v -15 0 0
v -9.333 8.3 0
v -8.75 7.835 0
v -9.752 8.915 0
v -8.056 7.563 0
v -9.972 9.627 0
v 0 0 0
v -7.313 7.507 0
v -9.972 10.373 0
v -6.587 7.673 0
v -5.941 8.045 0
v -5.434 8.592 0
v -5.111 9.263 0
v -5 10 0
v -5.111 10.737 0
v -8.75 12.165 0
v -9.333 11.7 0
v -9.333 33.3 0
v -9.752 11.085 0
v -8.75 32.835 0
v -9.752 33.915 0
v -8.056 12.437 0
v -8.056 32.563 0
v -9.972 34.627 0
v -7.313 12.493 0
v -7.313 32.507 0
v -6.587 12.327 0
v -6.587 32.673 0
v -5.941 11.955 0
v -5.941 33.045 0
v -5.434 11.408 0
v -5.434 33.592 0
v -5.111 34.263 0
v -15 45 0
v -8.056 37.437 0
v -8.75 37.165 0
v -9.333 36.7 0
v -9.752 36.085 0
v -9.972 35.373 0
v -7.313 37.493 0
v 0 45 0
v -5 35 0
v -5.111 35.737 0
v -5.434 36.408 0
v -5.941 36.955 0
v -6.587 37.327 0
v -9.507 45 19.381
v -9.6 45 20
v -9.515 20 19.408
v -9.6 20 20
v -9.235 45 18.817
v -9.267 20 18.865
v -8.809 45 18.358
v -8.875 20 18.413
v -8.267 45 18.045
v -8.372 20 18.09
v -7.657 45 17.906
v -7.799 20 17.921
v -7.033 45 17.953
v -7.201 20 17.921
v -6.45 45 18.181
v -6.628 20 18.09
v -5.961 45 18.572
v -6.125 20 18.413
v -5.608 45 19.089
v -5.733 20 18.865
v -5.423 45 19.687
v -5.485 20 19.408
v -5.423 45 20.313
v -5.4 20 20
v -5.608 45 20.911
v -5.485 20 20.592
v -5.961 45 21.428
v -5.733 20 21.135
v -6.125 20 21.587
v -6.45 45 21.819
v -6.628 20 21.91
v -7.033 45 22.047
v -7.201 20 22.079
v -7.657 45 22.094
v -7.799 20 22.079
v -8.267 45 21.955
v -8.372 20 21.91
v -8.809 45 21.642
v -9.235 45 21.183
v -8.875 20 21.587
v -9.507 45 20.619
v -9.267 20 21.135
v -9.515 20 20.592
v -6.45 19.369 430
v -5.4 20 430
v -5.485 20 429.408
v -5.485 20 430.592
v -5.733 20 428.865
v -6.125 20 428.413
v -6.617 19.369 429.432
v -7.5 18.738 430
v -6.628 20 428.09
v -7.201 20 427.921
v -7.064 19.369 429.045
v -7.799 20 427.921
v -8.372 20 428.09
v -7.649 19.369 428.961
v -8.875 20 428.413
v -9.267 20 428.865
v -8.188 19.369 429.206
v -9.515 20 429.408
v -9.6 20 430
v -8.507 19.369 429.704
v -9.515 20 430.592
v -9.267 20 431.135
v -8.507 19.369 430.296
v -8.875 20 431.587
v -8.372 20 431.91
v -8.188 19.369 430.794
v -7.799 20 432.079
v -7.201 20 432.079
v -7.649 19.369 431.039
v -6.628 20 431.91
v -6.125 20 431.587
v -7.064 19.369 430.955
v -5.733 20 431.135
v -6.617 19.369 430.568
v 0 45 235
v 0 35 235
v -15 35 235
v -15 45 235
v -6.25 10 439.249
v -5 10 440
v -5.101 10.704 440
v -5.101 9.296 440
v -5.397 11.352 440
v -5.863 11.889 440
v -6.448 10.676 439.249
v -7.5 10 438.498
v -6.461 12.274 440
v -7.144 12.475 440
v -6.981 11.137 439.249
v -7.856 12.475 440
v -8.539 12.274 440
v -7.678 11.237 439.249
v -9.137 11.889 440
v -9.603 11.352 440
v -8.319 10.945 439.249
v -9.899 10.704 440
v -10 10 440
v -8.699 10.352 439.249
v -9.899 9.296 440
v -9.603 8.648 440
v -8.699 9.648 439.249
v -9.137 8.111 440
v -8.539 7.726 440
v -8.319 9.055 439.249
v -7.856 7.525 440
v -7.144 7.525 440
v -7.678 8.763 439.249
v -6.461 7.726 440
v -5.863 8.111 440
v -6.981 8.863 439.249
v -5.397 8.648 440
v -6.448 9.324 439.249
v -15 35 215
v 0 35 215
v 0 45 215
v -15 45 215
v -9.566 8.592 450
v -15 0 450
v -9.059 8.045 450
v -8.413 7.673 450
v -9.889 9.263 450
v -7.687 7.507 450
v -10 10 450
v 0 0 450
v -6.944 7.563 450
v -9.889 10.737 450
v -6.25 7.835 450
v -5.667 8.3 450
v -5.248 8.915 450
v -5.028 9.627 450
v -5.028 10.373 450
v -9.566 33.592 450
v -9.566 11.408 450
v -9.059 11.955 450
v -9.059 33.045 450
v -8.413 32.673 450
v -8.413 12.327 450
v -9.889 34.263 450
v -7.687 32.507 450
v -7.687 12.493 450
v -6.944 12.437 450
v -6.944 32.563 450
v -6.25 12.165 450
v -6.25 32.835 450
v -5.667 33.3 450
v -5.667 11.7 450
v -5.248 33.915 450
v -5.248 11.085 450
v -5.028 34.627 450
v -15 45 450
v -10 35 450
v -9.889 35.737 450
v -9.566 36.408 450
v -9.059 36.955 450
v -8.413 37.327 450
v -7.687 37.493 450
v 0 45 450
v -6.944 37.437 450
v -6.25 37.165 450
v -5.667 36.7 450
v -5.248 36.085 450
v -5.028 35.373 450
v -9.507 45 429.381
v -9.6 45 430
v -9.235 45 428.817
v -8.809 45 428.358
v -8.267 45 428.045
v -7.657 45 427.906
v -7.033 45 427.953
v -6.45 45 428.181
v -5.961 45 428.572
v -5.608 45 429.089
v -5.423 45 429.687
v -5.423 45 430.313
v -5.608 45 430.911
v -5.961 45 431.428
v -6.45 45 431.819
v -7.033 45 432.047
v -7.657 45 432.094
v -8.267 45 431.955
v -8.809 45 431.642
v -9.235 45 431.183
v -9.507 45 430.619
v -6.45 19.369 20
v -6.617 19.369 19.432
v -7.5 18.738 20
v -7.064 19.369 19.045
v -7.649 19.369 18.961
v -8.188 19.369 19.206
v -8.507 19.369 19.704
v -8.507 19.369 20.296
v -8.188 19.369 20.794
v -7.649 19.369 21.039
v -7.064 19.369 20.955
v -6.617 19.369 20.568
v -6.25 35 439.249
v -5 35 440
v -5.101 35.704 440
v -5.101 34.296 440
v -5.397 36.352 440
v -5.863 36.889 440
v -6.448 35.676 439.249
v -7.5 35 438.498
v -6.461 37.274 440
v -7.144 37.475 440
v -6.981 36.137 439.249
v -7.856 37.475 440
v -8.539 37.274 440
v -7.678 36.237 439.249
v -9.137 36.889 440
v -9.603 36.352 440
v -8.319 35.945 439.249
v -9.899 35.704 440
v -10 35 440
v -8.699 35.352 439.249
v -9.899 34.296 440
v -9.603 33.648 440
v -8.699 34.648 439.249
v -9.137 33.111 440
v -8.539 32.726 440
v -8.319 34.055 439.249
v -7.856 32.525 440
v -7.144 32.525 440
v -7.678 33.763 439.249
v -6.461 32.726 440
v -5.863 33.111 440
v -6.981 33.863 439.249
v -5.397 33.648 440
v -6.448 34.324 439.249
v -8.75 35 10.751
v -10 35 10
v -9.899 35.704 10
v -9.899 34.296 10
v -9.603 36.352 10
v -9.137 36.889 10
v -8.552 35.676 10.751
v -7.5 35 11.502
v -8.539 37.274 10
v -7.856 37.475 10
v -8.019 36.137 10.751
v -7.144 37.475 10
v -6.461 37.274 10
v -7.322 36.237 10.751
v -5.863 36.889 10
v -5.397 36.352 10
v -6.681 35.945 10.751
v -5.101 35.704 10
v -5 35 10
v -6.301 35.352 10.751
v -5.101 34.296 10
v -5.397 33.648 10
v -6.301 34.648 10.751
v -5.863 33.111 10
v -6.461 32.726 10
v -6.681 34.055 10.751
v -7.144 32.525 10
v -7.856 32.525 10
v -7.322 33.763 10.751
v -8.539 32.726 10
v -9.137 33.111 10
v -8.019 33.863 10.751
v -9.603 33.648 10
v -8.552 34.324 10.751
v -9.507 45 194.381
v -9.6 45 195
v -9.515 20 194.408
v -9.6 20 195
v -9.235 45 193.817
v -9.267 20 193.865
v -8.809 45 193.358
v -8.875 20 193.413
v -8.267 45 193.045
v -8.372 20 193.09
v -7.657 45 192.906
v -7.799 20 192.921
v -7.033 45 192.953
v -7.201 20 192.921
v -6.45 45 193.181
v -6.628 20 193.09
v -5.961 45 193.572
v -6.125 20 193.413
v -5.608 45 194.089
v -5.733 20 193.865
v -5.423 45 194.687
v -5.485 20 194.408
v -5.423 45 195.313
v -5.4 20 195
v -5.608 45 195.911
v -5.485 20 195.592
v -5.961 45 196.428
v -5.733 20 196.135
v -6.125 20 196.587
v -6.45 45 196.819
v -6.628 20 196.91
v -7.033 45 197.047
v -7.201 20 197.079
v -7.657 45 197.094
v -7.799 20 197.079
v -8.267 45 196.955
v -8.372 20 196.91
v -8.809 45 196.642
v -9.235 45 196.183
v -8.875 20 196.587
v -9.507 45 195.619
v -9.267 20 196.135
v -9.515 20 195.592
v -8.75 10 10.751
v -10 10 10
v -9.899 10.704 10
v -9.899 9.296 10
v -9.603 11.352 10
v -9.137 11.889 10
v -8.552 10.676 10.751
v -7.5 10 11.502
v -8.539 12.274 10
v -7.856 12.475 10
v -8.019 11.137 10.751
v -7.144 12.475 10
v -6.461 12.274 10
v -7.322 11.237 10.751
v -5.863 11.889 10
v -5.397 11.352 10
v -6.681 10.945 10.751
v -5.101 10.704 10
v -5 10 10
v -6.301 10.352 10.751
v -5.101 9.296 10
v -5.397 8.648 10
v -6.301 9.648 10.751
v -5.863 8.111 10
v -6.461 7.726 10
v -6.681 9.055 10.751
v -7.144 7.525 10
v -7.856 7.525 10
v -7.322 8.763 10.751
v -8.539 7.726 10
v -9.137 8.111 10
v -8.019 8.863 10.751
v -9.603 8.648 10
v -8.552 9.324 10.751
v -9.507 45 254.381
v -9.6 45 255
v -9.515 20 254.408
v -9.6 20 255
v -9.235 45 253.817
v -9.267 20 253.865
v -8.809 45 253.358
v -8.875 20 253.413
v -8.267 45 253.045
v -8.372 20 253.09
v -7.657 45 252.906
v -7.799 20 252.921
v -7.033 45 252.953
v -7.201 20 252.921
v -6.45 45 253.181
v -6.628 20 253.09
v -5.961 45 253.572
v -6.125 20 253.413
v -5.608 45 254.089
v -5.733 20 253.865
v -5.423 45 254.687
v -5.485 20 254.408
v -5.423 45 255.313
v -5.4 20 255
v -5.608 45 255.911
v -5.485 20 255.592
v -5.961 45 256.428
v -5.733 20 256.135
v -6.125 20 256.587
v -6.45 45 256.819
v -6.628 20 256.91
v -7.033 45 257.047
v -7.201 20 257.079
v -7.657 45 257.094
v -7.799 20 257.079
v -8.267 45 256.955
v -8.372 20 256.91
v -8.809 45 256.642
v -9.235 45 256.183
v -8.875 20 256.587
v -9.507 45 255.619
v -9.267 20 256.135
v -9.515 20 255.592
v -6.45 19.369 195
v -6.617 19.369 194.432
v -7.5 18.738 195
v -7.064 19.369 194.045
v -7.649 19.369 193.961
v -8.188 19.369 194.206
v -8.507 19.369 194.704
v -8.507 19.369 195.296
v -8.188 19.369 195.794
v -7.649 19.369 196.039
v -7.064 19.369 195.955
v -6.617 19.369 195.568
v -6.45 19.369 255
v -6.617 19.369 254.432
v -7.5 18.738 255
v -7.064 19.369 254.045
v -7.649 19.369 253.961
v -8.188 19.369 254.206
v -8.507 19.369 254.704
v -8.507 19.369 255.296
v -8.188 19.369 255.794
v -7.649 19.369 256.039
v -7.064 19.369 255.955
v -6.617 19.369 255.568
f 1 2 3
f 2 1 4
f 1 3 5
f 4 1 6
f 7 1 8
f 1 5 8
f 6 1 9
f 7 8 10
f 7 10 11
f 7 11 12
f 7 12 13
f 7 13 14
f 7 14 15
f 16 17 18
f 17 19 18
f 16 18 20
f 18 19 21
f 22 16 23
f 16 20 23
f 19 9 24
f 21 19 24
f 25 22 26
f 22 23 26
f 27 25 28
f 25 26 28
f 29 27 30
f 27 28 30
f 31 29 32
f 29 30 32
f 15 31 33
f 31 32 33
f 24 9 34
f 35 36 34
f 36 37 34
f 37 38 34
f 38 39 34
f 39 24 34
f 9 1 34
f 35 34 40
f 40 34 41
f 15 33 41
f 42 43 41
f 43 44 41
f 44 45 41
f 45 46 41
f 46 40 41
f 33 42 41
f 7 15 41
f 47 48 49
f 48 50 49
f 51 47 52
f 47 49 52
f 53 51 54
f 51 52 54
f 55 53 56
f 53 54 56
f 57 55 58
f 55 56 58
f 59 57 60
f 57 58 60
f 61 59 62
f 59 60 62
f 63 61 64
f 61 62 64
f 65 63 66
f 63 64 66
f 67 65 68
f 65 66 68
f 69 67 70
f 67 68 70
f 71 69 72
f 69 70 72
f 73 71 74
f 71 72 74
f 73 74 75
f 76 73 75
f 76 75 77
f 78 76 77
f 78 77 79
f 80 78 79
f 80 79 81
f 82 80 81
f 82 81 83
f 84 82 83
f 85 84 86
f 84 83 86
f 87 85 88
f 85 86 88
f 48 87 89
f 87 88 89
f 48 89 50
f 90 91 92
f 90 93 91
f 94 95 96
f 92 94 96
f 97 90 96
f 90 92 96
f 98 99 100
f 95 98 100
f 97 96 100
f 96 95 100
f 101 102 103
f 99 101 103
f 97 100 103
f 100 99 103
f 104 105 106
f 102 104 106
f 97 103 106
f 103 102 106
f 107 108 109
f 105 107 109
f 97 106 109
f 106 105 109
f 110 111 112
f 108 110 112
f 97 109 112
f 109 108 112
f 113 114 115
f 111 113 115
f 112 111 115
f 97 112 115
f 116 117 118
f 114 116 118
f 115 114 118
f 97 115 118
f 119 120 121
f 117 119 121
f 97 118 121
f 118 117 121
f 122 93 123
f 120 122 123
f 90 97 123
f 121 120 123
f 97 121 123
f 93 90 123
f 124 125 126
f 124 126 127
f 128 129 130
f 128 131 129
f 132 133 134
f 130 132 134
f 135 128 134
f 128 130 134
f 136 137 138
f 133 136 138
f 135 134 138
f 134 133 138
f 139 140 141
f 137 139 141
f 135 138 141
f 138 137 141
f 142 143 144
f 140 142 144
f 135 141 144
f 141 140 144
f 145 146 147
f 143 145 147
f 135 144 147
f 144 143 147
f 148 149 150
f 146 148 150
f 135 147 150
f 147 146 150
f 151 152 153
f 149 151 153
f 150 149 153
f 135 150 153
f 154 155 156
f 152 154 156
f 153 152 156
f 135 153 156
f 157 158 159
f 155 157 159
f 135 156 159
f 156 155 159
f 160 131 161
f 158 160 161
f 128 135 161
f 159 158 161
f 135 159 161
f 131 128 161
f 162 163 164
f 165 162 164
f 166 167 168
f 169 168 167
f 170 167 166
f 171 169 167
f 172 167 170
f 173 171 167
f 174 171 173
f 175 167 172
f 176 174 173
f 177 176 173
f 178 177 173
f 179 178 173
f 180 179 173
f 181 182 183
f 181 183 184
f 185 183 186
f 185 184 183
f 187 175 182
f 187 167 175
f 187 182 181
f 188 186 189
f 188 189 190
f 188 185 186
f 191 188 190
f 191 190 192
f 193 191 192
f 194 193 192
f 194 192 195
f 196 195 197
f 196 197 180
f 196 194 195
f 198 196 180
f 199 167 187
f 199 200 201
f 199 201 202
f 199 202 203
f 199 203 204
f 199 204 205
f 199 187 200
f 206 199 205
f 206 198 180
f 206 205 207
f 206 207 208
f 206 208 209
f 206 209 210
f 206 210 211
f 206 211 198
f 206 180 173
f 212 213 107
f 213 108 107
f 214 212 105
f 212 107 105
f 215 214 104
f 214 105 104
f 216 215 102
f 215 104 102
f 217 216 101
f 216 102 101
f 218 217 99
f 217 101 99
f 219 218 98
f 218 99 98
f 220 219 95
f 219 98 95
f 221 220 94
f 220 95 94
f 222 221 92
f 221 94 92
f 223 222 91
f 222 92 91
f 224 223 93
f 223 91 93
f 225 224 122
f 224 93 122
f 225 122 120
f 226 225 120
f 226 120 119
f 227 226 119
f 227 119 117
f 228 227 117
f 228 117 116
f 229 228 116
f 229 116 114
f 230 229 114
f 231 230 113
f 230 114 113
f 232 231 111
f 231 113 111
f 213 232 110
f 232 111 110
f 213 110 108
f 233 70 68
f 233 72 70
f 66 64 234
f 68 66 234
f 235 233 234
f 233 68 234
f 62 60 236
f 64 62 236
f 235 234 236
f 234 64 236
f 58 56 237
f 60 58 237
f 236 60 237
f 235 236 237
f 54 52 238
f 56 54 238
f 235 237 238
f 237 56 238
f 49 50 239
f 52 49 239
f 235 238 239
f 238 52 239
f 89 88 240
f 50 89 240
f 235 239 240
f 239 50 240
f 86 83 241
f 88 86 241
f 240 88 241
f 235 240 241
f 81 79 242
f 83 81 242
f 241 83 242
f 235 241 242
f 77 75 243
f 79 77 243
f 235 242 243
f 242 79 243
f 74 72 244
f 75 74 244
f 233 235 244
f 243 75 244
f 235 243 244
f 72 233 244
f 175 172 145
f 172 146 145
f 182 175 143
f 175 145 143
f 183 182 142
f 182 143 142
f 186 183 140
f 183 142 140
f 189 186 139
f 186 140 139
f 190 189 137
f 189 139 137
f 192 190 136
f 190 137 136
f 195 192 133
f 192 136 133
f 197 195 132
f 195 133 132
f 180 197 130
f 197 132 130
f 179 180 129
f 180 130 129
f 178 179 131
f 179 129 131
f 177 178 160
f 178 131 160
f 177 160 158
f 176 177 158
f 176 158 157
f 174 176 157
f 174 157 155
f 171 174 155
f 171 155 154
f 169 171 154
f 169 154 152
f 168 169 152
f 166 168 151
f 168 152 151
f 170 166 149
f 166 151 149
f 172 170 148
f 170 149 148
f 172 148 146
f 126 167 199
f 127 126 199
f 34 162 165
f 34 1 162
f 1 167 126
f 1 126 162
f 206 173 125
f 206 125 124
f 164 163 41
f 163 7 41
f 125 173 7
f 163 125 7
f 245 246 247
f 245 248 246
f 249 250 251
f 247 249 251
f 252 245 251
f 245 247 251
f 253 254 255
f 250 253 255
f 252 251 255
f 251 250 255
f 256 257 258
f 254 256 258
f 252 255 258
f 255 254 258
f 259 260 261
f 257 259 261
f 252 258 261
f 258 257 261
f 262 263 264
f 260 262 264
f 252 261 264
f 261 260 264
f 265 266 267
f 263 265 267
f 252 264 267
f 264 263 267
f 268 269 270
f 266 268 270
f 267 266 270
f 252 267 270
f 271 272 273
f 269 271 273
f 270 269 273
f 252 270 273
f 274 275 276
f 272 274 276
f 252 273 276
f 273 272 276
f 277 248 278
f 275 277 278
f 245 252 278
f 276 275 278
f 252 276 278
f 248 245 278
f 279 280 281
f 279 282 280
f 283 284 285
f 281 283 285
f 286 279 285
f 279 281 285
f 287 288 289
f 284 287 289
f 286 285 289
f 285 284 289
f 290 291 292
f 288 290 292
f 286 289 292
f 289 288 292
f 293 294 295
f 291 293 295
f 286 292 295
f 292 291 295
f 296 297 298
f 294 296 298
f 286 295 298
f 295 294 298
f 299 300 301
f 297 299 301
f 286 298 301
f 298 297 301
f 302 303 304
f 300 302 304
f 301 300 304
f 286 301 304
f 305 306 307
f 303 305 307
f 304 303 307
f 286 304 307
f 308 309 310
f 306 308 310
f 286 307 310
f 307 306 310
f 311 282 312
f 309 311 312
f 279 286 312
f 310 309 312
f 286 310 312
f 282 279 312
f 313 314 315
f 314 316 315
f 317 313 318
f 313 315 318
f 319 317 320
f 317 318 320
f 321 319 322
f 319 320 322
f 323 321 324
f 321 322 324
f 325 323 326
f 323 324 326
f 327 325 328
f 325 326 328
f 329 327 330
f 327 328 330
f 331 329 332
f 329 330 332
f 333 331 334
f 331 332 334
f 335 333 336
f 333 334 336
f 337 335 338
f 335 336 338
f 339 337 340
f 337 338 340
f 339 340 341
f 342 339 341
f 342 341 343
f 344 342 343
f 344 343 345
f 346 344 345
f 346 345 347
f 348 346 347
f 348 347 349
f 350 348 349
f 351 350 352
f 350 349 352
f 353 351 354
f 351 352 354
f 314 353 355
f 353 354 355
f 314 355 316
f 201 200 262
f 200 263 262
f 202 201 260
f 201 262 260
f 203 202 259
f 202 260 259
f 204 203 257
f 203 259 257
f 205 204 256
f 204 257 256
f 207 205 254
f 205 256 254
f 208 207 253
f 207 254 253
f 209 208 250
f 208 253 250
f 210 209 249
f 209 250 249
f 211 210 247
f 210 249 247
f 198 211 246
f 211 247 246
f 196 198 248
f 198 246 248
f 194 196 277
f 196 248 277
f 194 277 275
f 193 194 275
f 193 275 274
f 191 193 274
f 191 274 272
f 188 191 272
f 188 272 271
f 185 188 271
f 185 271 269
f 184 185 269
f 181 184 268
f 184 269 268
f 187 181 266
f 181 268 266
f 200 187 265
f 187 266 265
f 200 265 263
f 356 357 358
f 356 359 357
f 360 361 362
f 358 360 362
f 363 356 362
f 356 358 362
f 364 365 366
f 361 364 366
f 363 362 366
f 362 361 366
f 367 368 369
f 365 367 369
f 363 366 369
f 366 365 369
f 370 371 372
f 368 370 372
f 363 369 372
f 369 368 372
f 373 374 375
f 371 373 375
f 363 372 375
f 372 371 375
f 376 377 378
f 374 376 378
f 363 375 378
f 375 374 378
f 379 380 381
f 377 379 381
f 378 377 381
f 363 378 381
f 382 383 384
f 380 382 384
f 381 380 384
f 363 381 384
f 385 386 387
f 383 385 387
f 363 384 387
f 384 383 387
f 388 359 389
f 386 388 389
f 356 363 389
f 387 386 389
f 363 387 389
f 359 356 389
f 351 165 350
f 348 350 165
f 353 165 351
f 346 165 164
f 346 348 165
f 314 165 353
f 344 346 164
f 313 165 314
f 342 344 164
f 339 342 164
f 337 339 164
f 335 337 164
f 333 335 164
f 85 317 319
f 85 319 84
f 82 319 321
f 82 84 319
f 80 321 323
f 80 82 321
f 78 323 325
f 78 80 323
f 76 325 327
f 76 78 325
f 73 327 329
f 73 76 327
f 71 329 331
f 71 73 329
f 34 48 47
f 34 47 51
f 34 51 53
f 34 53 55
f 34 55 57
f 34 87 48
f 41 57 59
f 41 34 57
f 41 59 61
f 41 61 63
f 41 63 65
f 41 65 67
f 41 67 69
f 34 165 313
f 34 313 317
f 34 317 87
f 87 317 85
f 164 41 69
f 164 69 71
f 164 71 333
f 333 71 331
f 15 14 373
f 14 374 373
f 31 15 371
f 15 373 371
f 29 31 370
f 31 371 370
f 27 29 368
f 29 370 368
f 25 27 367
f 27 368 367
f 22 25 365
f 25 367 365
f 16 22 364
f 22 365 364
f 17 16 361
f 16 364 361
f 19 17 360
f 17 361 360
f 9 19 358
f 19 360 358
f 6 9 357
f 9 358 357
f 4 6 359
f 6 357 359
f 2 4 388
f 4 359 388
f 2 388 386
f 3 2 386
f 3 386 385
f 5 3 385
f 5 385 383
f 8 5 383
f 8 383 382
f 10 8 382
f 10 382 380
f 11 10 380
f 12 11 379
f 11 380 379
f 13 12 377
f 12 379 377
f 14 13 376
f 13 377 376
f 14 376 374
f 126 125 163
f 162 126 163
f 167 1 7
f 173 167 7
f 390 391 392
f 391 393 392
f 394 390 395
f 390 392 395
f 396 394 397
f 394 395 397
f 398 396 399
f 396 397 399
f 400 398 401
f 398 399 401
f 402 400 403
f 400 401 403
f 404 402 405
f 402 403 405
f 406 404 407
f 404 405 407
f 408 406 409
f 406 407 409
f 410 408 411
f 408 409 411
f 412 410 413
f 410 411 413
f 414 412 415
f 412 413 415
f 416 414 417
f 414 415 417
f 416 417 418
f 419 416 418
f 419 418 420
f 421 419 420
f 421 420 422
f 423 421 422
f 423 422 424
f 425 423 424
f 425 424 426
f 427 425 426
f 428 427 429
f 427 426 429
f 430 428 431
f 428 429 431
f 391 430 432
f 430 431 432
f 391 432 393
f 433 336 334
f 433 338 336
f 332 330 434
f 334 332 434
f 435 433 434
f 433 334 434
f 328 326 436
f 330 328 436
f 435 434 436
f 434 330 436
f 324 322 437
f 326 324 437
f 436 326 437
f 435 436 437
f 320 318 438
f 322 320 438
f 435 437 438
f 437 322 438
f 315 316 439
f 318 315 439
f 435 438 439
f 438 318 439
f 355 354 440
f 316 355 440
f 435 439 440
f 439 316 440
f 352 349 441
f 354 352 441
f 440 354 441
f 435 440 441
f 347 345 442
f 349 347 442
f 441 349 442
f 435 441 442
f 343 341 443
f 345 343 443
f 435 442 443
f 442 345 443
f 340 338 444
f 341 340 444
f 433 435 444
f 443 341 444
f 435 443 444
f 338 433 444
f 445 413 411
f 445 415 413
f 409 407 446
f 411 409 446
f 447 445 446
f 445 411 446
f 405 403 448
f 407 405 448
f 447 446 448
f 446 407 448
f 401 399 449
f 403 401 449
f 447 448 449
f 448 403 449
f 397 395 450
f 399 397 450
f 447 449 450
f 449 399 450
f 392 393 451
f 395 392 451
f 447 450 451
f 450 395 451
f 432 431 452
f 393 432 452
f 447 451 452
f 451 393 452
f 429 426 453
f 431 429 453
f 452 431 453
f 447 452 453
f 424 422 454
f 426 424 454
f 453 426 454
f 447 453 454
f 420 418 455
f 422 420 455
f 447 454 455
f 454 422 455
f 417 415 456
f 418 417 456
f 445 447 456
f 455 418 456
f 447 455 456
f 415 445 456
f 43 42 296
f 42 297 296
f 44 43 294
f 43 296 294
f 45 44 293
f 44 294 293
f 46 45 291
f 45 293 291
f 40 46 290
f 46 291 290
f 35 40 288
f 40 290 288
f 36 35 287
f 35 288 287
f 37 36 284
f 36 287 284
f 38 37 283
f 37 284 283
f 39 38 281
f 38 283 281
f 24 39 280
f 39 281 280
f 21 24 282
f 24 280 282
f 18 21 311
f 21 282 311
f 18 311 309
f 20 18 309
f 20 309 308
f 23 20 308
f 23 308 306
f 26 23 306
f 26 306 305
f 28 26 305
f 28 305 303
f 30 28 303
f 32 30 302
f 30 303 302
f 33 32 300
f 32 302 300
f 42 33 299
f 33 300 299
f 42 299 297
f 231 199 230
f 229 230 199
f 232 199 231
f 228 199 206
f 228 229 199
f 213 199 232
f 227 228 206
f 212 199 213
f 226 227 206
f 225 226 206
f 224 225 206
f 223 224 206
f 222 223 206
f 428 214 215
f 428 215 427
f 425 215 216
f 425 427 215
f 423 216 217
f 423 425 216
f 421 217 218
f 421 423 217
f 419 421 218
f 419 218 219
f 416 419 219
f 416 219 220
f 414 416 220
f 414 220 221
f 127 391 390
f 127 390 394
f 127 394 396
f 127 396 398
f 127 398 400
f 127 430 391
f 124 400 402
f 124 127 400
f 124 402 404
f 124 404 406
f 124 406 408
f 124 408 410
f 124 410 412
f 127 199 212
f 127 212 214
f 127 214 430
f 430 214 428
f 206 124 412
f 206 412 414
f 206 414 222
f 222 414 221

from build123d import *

# Parameters (mm, degrees)
ESQUISSE1_W                                   = 15
ESQUISSE1_H                                   = 45
BOSS_EXTRU_1_DEPTH                            = 450
TROU_POUR_TARAUDAGE_POUR_TROU_TARAUD_M6_D     = 5
TROU_POUR_TARAUDAGE_POUR_TROU_TARAUD_M6_DEPTH = 10
TROU_POUR_TARAUDAGE_POUR_TROU_TARAUD_M6_TIP   = 1.502151548
TROU_POUR_TARAUDAGE_POUR_TROU_TARAUD_2_D      = 5
TROU_POUR_TARAUDAGE_POUR_TROU_TARAUD_2_DEPTH  = 10
TROU_POUR_TARAUDAGE_POUR_TROU_TARAUD_2_TIP    = 1.502151548
ESQUISSE10_W                                  = 20
ESQUISSE10_H                                  = 10
ENL_V_MAT_EXTRU_1_DEPTH                       = 15
TROU_POUR_TARAUDAGE_POUR_TROU_TARAUD_M5_D     = 4.2
TROU_POUR_TARAUDAGE_POUR_TROU_TARAUD_M5_DEPTH = 25
TROU_POUR_TARAUDAGE_POUR_TROU_TARAUD_M5_TIP   = 1.2618073


with BuildPart() as part:
    # Esquisse1 → Boss.-Extru.1 (new body)
    with BuildSketch(Plane.XY):
        with Locations((-7.5, 22.5)):
            Rectangle(ESQUISSE1_W, ESQUISSE1_H)
    extrude(amount=BOSS_EXTRU_1_DEPTH)

    # Trou pour taraudage pour trou taraud_ M6
    with Locations(Plane.XY.offset(450)):
        with Locations((-7.5, 35), (-7.5, 10)):
            Hole(TROU_POUR_TARAUDAGE_POUR_TROU_TARAUD_M6_D / 2, depth=TROU_POUR_TARAUDAGE_POUR_TROU_TARAUD_M6_DEPTH)
            with Locations((0, 0, -(TROU_POUR_TARAUDAGE_POUR_TROU_TARAUD_M6_DEPTH + TROU_POUR_TARAUDAGE_POUR_TROU_TARAUD_M6_TIP / 2))):  # 118° drill point
                Cone(0, TROU_POUR_TARAUDAGE_POUR_TROU_TARAUD_M6_D / 2, TROU_POUR_TARAUDAGE_POUR_TROU_TARAUD_M6_TIP, mode=Mode.SUBTRACT)

    # Trou pour taraudage pour trou taraud 2
    with Locations(Plane(origin=(0, 0, 0), x_dir=(-1, 0, 0), z_dir=(0, 0, -1))):
        with Locations((7.5, 35), (7.5, 10)):
            Hole(TROU_POUR_TARAUDAGE_POUR_TROU_TARAUD_2_D / 2, depth=TROU_POUR_TARAUDAGE_POUR_TROU_TARAUD_2_DEPTH)
            with Locations((0, 0, -(TROU_POUR_TARAUDAGE_POUR_TROU_TARAUD_2_DEPTH + TROU_POUR_TARAUDAGE_POUR_TROU_TARAUD_2_TIP / 2))):  # 118° drill point
                Cone(0, TROU_POUR_TARAUDAGE_POUR_TROU_TARAUD_2_D / 2, TROU_POUR_TARAUDAGE_POUR_TROU_TARAUD_2_TIP, mode=Mode.SUBTRACT)

    # Esquisse10 → Enlèv. mat.-Extru.1 (cut)
    with BuildSketch(Plane(origin=(0, 0, 0), x_dir=(0, 0, -1), z_dir=(1, 0, 0))):
        with Locations((-225, 40)):
            Rectangle(ESQUISSE10_W, ESQUISSE10_H)
    extrude(amount=-ENL_V_MAT_EXTRU_1_DEPTH, mode=Mode.SUBTRACT)

    # Trou pour taraudage pour trou taraudé M51
    with Locations(Plane(origin=(0, 45, 0), x_dir=(1, 0, 0), z_dir=(0, 1, 0))):
        with Locations((-7.5, -430), (-7.5, -255), (-7.5, -195), (-7.5, -20)):
            Hole(TROU_POUR_TARAUDAGE_POUR_TROU_TARAUD_M5_D / 2, depth=TROU_POUR_TARAUDAGE_POUR_TROU_TARAUD_M5_DEPTH)
            with Locations((0, 0, -(TROU_POUR_TARAUDAGE_POUR_TROU_TARAUD_M5_DEPTH + TROU_POUR_TARAUDAGE_POUR_TROU_TARAUD_M5_TIP / 2))):  # 118° drill point
                Cone(0, TROU_POUR_TARAUDAGE_POUR_TROU_TARAUD_M5_D / 2, TROU_POUR_TARAUDAGE_POUR_TROU_TARAUD_M5_TIP, mode=Mode.SUBTRACT)


solid = part.part
